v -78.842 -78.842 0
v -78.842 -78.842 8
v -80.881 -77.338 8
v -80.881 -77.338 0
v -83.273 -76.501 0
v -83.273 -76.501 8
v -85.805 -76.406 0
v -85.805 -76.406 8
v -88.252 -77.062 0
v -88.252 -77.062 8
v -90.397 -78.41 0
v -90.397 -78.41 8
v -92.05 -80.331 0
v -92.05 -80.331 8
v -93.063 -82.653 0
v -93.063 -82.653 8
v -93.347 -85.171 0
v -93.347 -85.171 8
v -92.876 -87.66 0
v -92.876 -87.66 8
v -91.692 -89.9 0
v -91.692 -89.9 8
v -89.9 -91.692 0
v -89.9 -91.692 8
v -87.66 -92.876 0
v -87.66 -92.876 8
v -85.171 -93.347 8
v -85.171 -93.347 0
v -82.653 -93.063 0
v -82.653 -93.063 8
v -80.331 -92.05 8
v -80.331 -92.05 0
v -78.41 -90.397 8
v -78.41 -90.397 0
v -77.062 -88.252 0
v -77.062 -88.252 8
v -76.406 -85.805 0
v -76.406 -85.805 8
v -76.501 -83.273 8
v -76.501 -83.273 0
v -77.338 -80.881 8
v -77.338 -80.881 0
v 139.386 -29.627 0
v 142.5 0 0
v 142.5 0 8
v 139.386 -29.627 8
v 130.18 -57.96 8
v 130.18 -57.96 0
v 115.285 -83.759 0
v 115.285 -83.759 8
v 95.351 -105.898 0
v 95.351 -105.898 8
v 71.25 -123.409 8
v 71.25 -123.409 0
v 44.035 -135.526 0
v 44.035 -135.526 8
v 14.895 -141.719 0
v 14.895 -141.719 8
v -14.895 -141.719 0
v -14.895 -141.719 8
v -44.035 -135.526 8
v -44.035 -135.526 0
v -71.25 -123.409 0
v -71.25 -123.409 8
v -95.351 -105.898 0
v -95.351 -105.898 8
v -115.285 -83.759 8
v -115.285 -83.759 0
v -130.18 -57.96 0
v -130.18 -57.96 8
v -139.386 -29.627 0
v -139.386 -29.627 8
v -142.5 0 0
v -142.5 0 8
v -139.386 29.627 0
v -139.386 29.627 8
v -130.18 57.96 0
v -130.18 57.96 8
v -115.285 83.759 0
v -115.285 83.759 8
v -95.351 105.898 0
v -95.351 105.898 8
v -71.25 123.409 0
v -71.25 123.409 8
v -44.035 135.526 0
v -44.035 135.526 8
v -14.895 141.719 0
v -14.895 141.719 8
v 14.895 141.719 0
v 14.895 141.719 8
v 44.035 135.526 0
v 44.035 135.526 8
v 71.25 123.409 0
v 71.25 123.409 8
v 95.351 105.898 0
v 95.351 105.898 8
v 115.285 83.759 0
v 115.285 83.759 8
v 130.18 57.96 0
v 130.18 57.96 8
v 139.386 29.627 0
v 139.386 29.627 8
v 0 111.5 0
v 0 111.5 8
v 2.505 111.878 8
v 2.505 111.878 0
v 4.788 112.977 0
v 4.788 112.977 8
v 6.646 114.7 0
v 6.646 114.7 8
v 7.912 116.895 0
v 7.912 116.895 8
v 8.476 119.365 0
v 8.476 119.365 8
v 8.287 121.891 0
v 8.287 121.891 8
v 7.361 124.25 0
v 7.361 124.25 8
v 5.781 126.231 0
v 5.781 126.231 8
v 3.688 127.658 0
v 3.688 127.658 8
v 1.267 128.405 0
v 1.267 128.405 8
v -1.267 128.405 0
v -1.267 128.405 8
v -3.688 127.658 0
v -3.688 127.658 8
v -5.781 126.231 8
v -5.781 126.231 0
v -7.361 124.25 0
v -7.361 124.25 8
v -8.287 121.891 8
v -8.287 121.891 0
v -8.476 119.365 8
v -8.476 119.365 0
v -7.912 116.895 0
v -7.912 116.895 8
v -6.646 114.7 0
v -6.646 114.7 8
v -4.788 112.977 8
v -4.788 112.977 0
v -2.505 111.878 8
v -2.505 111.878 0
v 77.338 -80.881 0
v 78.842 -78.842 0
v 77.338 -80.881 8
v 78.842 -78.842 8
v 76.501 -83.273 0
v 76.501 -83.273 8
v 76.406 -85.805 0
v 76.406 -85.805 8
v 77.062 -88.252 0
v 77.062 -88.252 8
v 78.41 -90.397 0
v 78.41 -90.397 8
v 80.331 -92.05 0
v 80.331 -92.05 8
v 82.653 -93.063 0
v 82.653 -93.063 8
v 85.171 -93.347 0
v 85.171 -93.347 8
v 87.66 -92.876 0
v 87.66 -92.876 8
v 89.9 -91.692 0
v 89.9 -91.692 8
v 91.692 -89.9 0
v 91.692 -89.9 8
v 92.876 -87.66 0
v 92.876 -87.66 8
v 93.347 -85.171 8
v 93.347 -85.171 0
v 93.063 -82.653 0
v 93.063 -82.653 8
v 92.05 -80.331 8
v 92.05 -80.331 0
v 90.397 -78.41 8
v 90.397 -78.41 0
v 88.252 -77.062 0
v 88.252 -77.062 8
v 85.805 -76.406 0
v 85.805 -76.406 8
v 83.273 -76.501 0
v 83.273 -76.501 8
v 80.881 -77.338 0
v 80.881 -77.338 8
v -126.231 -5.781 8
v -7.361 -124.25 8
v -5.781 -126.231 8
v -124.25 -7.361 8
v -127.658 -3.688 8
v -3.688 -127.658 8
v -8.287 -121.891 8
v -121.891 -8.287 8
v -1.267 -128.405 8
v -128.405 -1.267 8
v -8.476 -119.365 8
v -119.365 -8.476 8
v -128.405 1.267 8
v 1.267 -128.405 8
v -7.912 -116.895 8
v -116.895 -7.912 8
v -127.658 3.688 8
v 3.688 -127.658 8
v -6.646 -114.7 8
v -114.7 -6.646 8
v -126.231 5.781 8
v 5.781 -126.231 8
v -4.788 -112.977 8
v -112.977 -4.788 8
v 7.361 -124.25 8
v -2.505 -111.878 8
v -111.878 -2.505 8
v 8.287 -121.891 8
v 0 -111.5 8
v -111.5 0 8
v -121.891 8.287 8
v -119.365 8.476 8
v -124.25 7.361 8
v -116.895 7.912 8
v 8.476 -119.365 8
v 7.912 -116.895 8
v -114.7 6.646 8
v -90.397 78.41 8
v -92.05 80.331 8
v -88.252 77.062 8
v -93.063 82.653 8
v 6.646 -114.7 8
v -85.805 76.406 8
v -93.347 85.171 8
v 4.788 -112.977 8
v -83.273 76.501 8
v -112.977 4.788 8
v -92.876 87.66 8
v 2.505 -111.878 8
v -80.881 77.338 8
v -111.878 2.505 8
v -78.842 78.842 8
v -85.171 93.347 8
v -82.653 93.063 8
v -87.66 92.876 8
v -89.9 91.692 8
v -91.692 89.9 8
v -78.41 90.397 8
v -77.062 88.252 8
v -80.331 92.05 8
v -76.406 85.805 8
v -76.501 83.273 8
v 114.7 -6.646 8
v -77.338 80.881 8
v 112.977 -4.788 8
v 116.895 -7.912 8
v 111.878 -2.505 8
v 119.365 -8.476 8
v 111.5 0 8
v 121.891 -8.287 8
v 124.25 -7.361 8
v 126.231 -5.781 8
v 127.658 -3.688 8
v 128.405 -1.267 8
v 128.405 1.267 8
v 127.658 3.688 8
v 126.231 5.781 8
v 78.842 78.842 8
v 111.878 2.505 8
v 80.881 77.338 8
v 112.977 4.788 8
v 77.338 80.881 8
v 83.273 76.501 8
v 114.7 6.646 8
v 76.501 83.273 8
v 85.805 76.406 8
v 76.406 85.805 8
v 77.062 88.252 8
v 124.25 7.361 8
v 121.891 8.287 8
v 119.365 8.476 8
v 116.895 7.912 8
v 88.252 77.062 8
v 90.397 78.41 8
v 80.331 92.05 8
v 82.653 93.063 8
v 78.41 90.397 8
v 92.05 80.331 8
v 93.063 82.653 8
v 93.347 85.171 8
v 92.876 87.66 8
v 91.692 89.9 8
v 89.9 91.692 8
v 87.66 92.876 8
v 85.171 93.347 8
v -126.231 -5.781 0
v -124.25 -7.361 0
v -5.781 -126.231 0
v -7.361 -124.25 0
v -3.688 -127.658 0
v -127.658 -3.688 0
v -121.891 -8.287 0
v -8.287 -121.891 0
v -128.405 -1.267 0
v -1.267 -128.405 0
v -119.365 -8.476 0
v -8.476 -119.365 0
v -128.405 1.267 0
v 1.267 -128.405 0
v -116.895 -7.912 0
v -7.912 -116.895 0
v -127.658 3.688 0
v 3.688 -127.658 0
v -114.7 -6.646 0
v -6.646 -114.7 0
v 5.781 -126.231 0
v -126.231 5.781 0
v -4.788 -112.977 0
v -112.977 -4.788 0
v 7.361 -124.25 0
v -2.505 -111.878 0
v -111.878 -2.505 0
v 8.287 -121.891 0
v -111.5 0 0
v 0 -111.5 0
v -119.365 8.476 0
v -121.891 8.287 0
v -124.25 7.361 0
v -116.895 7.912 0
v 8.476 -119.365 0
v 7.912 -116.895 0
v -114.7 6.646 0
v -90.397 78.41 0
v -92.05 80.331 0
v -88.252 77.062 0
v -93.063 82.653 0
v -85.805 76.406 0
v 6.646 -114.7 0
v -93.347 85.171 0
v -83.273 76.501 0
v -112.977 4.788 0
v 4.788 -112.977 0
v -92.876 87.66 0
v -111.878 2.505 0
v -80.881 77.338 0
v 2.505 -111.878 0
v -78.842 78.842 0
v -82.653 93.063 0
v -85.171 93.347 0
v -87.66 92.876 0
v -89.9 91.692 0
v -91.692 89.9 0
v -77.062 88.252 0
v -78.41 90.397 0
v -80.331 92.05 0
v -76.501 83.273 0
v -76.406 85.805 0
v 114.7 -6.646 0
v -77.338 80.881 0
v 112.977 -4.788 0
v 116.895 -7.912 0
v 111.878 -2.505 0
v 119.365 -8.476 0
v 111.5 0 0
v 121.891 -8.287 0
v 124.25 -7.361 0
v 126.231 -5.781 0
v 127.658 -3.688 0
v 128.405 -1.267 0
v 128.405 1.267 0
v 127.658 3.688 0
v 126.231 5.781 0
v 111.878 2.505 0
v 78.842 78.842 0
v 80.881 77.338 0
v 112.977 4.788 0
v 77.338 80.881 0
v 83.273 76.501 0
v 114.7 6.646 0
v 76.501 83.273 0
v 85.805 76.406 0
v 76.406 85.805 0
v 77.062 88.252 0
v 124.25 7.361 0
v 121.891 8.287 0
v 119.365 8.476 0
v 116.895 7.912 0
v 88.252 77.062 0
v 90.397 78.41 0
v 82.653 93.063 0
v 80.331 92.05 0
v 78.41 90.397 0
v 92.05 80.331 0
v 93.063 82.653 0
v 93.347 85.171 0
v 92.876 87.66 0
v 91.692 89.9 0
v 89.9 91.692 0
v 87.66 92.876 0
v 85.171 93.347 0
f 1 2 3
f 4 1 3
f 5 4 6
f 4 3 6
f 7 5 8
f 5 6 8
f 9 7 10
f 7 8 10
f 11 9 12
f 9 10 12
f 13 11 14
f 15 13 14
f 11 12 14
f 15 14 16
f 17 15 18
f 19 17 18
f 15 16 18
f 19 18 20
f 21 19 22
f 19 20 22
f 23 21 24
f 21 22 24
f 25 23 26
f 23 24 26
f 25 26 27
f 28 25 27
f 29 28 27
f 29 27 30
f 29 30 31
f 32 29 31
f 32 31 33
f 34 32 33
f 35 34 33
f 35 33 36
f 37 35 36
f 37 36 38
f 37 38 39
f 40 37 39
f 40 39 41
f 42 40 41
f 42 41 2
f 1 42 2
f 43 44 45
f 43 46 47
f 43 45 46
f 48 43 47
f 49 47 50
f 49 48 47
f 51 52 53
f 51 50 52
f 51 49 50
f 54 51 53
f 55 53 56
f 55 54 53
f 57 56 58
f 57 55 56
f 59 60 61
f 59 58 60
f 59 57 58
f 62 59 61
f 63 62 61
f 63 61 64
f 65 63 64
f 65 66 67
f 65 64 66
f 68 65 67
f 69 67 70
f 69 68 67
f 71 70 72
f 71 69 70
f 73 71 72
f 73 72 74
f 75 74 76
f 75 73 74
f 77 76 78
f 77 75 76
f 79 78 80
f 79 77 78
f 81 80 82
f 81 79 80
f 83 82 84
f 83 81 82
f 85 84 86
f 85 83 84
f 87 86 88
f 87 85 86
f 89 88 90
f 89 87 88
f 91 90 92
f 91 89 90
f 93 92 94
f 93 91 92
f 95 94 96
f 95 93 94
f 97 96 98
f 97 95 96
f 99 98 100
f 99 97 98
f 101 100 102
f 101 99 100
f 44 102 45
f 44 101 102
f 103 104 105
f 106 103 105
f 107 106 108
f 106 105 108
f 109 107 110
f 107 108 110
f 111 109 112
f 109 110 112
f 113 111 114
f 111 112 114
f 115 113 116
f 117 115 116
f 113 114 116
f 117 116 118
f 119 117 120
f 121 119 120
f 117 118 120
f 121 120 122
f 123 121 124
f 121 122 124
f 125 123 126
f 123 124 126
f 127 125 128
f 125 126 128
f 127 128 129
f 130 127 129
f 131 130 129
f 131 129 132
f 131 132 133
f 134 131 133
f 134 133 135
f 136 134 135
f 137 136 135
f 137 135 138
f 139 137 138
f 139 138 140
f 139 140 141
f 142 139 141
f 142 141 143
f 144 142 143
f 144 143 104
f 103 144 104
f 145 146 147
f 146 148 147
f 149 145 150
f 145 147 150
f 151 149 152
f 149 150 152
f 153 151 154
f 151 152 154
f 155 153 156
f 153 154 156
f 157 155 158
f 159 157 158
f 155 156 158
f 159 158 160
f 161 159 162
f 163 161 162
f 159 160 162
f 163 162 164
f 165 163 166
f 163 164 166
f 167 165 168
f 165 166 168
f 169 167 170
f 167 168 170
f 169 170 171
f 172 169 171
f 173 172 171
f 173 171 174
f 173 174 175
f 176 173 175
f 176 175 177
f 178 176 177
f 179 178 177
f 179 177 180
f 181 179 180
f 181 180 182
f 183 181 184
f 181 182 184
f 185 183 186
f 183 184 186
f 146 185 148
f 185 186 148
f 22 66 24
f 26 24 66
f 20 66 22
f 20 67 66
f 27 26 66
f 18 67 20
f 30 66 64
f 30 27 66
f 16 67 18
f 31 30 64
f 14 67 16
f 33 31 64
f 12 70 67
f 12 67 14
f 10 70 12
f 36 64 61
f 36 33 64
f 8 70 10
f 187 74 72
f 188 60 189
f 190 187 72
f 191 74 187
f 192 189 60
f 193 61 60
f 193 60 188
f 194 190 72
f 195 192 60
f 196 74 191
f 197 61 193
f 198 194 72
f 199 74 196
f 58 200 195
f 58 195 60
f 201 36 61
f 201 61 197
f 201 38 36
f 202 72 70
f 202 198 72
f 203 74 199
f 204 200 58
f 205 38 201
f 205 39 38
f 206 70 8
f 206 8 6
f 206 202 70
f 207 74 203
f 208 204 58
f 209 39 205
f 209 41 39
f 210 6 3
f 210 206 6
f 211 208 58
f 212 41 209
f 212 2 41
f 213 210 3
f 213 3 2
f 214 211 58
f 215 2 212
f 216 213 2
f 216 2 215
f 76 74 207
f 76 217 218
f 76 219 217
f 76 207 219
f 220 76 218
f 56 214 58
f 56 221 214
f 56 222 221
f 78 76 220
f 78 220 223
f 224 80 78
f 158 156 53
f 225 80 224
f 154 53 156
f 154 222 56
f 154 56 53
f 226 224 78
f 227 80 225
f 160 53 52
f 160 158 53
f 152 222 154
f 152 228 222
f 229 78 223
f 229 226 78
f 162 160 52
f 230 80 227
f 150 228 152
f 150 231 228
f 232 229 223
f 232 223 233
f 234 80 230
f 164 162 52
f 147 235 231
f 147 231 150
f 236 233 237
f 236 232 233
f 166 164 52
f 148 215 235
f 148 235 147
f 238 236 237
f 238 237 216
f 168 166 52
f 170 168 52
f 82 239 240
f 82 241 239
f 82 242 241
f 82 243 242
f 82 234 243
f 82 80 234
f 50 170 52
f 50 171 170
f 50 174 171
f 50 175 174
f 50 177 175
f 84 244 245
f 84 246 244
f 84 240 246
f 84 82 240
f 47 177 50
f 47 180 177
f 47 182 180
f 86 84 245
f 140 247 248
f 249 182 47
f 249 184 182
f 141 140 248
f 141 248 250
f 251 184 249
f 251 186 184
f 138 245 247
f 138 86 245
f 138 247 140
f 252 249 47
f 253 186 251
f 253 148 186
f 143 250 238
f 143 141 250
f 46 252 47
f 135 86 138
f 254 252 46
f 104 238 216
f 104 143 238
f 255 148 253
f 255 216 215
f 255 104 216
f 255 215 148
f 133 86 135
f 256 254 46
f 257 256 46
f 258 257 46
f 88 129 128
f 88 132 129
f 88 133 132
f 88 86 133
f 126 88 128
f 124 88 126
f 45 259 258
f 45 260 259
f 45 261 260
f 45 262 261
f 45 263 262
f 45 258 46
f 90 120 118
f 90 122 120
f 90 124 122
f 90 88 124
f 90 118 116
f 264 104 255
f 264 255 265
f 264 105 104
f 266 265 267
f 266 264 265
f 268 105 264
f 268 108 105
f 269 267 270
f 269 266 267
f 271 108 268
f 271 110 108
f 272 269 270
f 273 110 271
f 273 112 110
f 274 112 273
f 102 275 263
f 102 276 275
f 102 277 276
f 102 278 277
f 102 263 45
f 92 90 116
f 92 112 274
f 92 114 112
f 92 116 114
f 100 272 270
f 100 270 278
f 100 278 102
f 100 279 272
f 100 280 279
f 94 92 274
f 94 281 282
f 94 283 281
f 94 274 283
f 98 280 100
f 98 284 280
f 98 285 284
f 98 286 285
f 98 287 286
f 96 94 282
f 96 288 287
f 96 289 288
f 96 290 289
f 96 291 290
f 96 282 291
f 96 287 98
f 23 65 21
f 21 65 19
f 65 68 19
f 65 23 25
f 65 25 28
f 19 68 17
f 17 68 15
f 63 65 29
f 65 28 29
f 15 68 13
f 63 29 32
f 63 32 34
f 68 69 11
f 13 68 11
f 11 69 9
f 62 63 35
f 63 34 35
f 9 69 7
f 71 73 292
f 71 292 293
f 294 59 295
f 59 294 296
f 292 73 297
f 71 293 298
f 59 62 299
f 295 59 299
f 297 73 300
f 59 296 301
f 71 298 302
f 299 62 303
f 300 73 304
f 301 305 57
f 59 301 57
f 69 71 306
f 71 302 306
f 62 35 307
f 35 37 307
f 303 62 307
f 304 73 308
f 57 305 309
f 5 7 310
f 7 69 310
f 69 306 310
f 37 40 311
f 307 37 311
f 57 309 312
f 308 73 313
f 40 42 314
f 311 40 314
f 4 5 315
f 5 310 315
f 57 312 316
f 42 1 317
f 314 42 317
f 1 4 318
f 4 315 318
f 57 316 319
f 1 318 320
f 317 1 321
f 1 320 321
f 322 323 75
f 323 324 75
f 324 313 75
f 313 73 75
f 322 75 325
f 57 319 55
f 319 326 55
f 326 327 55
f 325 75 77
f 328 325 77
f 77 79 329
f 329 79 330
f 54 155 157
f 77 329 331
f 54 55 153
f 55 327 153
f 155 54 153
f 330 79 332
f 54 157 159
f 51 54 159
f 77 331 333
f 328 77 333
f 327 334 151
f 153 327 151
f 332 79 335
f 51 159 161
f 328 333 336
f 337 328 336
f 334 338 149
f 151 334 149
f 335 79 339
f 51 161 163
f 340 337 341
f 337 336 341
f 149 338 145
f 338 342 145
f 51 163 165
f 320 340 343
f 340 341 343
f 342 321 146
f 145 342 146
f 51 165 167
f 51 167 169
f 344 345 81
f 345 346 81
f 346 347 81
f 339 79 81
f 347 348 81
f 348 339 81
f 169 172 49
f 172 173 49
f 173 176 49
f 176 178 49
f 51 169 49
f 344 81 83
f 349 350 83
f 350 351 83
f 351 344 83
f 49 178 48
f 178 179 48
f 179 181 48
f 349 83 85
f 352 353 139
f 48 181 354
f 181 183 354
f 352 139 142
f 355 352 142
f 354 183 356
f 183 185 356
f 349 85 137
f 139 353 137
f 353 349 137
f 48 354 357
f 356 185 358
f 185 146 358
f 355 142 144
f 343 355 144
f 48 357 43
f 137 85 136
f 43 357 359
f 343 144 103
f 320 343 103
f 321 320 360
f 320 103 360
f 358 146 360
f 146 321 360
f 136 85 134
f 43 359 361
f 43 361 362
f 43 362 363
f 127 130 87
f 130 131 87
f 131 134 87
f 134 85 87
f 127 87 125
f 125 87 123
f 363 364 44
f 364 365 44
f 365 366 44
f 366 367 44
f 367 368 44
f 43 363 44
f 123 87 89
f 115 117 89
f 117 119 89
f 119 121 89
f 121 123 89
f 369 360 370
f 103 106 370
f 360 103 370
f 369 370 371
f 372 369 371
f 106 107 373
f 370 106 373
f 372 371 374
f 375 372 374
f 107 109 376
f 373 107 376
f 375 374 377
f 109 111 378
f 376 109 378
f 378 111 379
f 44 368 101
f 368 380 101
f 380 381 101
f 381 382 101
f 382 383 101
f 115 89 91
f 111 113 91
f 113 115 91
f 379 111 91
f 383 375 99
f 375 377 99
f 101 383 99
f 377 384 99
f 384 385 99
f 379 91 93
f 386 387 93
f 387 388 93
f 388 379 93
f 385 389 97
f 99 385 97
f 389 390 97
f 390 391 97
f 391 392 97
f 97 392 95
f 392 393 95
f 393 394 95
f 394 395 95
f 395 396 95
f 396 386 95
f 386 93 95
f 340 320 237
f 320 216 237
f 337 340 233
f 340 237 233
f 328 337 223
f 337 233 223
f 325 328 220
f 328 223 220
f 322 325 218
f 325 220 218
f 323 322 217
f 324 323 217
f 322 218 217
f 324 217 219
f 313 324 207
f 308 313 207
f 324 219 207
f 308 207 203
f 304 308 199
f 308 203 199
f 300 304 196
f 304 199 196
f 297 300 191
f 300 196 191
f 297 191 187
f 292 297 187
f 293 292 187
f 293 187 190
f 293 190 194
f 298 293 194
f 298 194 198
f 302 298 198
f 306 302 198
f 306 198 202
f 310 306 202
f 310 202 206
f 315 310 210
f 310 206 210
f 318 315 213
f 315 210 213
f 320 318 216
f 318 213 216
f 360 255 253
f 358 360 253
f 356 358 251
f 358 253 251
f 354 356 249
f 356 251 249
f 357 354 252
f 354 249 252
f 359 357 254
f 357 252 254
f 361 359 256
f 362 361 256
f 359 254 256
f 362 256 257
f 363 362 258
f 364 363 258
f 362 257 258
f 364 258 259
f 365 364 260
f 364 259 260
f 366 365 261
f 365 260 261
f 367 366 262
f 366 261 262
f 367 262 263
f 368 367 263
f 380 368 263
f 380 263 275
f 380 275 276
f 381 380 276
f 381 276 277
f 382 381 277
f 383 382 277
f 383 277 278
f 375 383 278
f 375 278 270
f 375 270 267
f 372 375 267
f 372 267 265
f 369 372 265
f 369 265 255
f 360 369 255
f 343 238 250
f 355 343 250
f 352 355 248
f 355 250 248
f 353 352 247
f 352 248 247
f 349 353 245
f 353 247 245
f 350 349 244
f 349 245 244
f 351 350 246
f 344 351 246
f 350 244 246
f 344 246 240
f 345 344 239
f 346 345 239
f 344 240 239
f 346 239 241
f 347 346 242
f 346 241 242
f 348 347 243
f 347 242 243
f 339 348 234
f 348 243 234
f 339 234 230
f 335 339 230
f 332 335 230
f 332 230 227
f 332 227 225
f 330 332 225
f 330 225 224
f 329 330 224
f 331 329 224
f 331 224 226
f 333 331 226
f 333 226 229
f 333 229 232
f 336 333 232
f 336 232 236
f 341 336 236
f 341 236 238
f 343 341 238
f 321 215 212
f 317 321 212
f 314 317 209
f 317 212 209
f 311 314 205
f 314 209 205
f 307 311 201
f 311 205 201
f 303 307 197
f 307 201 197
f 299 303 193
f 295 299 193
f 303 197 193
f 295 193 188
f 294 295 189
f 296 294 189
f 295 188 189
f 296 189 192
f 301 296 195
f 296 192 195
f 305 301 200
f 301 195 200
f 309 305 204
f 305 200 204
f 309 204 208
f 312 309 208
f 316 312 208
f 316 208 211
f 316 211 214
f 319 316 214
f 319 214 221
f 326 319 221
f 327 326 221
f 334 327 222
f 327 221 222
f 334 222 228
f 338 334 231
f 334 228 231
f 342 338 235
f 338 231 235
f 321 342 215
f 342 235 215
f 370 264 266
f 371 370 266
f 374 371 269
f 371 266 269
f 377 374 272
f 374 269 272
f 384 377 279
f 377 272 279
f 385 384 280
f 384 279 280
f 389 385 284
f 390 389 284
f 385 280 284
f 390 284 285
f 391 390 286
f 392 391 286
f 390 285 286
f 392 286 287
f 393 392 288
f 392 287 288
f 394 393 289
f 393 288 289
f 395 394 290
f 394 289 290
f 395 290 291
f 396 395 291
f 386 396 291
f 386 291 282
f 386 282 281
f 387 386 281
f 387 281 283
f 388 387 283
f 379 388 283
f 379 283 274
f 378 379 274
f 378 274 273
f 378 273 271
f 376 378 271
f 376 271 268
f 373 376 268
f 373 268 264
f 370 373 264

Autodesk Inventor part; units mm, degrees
ref_plane "YZ Plane" through (0, 0, 0) normal (1, 0, 0) x (0, 1, 0)
ref_plane "XZ Plane" through (0, 0, 0) normal (0, 1, 0) x (-1, 0, 0)
ref_plane "XY Plane" through (0, 0, 0) normal (0, 0, 1) x (1, 0, 0)
sketch "Sketch2" plane through (0, 0, 0) normal (0, 0, 1) x (1, 0, 0)
  circle A0 centre (0, 0) radius 80.5
  circle A1 centre (0, 0) radius 142.5
  dimension "d25" = 161
  dimension "d27" = 285
extrude "Plate2" add sketch "Sketch2" along normal blind 8 contours A0 | A1
sketch "Sketch3" plane through (0, 0, 8) normal (0, 0, 1) x (1, 0, 0)
  circle A0 centre (-120, 0) radius 8.5
  circle A1 centre (0, 0) radius 120 construction
  dimension "d28" = 240
  dimension "d15" = 17
extrude "Cut1" cut sketch "Sketch3" against normal blind 8
pattern_circular "Circular Pattern1" count 8 over 360 about axis through (0, 0, -10) along (0, 0, 1) of "Cut1"
equation "\"d17\" = Thickness"
equation "\"d14\" = Thickness"
equation "\"BendReliefWidth\" = Thickness"
equation "\"BendReliefDepth\" = 0.5 * Thickness"
equation "\"CornerReliefSize\" = 4 * Thickness"
equation "\"MinimumRemnant\" = 2 * Thickness"
equation "\"TransitionRadius\" = BendRadius"
equation "\"JacobiRadiusSize\" = BendRadius"
equation "\"GapSize\" = Thickness"
equation "\"Thickness\" = 8"
equation "\"BendRadius\" = 6"
properties part number "SLM 1707 charging flange cup" material "Steel"
